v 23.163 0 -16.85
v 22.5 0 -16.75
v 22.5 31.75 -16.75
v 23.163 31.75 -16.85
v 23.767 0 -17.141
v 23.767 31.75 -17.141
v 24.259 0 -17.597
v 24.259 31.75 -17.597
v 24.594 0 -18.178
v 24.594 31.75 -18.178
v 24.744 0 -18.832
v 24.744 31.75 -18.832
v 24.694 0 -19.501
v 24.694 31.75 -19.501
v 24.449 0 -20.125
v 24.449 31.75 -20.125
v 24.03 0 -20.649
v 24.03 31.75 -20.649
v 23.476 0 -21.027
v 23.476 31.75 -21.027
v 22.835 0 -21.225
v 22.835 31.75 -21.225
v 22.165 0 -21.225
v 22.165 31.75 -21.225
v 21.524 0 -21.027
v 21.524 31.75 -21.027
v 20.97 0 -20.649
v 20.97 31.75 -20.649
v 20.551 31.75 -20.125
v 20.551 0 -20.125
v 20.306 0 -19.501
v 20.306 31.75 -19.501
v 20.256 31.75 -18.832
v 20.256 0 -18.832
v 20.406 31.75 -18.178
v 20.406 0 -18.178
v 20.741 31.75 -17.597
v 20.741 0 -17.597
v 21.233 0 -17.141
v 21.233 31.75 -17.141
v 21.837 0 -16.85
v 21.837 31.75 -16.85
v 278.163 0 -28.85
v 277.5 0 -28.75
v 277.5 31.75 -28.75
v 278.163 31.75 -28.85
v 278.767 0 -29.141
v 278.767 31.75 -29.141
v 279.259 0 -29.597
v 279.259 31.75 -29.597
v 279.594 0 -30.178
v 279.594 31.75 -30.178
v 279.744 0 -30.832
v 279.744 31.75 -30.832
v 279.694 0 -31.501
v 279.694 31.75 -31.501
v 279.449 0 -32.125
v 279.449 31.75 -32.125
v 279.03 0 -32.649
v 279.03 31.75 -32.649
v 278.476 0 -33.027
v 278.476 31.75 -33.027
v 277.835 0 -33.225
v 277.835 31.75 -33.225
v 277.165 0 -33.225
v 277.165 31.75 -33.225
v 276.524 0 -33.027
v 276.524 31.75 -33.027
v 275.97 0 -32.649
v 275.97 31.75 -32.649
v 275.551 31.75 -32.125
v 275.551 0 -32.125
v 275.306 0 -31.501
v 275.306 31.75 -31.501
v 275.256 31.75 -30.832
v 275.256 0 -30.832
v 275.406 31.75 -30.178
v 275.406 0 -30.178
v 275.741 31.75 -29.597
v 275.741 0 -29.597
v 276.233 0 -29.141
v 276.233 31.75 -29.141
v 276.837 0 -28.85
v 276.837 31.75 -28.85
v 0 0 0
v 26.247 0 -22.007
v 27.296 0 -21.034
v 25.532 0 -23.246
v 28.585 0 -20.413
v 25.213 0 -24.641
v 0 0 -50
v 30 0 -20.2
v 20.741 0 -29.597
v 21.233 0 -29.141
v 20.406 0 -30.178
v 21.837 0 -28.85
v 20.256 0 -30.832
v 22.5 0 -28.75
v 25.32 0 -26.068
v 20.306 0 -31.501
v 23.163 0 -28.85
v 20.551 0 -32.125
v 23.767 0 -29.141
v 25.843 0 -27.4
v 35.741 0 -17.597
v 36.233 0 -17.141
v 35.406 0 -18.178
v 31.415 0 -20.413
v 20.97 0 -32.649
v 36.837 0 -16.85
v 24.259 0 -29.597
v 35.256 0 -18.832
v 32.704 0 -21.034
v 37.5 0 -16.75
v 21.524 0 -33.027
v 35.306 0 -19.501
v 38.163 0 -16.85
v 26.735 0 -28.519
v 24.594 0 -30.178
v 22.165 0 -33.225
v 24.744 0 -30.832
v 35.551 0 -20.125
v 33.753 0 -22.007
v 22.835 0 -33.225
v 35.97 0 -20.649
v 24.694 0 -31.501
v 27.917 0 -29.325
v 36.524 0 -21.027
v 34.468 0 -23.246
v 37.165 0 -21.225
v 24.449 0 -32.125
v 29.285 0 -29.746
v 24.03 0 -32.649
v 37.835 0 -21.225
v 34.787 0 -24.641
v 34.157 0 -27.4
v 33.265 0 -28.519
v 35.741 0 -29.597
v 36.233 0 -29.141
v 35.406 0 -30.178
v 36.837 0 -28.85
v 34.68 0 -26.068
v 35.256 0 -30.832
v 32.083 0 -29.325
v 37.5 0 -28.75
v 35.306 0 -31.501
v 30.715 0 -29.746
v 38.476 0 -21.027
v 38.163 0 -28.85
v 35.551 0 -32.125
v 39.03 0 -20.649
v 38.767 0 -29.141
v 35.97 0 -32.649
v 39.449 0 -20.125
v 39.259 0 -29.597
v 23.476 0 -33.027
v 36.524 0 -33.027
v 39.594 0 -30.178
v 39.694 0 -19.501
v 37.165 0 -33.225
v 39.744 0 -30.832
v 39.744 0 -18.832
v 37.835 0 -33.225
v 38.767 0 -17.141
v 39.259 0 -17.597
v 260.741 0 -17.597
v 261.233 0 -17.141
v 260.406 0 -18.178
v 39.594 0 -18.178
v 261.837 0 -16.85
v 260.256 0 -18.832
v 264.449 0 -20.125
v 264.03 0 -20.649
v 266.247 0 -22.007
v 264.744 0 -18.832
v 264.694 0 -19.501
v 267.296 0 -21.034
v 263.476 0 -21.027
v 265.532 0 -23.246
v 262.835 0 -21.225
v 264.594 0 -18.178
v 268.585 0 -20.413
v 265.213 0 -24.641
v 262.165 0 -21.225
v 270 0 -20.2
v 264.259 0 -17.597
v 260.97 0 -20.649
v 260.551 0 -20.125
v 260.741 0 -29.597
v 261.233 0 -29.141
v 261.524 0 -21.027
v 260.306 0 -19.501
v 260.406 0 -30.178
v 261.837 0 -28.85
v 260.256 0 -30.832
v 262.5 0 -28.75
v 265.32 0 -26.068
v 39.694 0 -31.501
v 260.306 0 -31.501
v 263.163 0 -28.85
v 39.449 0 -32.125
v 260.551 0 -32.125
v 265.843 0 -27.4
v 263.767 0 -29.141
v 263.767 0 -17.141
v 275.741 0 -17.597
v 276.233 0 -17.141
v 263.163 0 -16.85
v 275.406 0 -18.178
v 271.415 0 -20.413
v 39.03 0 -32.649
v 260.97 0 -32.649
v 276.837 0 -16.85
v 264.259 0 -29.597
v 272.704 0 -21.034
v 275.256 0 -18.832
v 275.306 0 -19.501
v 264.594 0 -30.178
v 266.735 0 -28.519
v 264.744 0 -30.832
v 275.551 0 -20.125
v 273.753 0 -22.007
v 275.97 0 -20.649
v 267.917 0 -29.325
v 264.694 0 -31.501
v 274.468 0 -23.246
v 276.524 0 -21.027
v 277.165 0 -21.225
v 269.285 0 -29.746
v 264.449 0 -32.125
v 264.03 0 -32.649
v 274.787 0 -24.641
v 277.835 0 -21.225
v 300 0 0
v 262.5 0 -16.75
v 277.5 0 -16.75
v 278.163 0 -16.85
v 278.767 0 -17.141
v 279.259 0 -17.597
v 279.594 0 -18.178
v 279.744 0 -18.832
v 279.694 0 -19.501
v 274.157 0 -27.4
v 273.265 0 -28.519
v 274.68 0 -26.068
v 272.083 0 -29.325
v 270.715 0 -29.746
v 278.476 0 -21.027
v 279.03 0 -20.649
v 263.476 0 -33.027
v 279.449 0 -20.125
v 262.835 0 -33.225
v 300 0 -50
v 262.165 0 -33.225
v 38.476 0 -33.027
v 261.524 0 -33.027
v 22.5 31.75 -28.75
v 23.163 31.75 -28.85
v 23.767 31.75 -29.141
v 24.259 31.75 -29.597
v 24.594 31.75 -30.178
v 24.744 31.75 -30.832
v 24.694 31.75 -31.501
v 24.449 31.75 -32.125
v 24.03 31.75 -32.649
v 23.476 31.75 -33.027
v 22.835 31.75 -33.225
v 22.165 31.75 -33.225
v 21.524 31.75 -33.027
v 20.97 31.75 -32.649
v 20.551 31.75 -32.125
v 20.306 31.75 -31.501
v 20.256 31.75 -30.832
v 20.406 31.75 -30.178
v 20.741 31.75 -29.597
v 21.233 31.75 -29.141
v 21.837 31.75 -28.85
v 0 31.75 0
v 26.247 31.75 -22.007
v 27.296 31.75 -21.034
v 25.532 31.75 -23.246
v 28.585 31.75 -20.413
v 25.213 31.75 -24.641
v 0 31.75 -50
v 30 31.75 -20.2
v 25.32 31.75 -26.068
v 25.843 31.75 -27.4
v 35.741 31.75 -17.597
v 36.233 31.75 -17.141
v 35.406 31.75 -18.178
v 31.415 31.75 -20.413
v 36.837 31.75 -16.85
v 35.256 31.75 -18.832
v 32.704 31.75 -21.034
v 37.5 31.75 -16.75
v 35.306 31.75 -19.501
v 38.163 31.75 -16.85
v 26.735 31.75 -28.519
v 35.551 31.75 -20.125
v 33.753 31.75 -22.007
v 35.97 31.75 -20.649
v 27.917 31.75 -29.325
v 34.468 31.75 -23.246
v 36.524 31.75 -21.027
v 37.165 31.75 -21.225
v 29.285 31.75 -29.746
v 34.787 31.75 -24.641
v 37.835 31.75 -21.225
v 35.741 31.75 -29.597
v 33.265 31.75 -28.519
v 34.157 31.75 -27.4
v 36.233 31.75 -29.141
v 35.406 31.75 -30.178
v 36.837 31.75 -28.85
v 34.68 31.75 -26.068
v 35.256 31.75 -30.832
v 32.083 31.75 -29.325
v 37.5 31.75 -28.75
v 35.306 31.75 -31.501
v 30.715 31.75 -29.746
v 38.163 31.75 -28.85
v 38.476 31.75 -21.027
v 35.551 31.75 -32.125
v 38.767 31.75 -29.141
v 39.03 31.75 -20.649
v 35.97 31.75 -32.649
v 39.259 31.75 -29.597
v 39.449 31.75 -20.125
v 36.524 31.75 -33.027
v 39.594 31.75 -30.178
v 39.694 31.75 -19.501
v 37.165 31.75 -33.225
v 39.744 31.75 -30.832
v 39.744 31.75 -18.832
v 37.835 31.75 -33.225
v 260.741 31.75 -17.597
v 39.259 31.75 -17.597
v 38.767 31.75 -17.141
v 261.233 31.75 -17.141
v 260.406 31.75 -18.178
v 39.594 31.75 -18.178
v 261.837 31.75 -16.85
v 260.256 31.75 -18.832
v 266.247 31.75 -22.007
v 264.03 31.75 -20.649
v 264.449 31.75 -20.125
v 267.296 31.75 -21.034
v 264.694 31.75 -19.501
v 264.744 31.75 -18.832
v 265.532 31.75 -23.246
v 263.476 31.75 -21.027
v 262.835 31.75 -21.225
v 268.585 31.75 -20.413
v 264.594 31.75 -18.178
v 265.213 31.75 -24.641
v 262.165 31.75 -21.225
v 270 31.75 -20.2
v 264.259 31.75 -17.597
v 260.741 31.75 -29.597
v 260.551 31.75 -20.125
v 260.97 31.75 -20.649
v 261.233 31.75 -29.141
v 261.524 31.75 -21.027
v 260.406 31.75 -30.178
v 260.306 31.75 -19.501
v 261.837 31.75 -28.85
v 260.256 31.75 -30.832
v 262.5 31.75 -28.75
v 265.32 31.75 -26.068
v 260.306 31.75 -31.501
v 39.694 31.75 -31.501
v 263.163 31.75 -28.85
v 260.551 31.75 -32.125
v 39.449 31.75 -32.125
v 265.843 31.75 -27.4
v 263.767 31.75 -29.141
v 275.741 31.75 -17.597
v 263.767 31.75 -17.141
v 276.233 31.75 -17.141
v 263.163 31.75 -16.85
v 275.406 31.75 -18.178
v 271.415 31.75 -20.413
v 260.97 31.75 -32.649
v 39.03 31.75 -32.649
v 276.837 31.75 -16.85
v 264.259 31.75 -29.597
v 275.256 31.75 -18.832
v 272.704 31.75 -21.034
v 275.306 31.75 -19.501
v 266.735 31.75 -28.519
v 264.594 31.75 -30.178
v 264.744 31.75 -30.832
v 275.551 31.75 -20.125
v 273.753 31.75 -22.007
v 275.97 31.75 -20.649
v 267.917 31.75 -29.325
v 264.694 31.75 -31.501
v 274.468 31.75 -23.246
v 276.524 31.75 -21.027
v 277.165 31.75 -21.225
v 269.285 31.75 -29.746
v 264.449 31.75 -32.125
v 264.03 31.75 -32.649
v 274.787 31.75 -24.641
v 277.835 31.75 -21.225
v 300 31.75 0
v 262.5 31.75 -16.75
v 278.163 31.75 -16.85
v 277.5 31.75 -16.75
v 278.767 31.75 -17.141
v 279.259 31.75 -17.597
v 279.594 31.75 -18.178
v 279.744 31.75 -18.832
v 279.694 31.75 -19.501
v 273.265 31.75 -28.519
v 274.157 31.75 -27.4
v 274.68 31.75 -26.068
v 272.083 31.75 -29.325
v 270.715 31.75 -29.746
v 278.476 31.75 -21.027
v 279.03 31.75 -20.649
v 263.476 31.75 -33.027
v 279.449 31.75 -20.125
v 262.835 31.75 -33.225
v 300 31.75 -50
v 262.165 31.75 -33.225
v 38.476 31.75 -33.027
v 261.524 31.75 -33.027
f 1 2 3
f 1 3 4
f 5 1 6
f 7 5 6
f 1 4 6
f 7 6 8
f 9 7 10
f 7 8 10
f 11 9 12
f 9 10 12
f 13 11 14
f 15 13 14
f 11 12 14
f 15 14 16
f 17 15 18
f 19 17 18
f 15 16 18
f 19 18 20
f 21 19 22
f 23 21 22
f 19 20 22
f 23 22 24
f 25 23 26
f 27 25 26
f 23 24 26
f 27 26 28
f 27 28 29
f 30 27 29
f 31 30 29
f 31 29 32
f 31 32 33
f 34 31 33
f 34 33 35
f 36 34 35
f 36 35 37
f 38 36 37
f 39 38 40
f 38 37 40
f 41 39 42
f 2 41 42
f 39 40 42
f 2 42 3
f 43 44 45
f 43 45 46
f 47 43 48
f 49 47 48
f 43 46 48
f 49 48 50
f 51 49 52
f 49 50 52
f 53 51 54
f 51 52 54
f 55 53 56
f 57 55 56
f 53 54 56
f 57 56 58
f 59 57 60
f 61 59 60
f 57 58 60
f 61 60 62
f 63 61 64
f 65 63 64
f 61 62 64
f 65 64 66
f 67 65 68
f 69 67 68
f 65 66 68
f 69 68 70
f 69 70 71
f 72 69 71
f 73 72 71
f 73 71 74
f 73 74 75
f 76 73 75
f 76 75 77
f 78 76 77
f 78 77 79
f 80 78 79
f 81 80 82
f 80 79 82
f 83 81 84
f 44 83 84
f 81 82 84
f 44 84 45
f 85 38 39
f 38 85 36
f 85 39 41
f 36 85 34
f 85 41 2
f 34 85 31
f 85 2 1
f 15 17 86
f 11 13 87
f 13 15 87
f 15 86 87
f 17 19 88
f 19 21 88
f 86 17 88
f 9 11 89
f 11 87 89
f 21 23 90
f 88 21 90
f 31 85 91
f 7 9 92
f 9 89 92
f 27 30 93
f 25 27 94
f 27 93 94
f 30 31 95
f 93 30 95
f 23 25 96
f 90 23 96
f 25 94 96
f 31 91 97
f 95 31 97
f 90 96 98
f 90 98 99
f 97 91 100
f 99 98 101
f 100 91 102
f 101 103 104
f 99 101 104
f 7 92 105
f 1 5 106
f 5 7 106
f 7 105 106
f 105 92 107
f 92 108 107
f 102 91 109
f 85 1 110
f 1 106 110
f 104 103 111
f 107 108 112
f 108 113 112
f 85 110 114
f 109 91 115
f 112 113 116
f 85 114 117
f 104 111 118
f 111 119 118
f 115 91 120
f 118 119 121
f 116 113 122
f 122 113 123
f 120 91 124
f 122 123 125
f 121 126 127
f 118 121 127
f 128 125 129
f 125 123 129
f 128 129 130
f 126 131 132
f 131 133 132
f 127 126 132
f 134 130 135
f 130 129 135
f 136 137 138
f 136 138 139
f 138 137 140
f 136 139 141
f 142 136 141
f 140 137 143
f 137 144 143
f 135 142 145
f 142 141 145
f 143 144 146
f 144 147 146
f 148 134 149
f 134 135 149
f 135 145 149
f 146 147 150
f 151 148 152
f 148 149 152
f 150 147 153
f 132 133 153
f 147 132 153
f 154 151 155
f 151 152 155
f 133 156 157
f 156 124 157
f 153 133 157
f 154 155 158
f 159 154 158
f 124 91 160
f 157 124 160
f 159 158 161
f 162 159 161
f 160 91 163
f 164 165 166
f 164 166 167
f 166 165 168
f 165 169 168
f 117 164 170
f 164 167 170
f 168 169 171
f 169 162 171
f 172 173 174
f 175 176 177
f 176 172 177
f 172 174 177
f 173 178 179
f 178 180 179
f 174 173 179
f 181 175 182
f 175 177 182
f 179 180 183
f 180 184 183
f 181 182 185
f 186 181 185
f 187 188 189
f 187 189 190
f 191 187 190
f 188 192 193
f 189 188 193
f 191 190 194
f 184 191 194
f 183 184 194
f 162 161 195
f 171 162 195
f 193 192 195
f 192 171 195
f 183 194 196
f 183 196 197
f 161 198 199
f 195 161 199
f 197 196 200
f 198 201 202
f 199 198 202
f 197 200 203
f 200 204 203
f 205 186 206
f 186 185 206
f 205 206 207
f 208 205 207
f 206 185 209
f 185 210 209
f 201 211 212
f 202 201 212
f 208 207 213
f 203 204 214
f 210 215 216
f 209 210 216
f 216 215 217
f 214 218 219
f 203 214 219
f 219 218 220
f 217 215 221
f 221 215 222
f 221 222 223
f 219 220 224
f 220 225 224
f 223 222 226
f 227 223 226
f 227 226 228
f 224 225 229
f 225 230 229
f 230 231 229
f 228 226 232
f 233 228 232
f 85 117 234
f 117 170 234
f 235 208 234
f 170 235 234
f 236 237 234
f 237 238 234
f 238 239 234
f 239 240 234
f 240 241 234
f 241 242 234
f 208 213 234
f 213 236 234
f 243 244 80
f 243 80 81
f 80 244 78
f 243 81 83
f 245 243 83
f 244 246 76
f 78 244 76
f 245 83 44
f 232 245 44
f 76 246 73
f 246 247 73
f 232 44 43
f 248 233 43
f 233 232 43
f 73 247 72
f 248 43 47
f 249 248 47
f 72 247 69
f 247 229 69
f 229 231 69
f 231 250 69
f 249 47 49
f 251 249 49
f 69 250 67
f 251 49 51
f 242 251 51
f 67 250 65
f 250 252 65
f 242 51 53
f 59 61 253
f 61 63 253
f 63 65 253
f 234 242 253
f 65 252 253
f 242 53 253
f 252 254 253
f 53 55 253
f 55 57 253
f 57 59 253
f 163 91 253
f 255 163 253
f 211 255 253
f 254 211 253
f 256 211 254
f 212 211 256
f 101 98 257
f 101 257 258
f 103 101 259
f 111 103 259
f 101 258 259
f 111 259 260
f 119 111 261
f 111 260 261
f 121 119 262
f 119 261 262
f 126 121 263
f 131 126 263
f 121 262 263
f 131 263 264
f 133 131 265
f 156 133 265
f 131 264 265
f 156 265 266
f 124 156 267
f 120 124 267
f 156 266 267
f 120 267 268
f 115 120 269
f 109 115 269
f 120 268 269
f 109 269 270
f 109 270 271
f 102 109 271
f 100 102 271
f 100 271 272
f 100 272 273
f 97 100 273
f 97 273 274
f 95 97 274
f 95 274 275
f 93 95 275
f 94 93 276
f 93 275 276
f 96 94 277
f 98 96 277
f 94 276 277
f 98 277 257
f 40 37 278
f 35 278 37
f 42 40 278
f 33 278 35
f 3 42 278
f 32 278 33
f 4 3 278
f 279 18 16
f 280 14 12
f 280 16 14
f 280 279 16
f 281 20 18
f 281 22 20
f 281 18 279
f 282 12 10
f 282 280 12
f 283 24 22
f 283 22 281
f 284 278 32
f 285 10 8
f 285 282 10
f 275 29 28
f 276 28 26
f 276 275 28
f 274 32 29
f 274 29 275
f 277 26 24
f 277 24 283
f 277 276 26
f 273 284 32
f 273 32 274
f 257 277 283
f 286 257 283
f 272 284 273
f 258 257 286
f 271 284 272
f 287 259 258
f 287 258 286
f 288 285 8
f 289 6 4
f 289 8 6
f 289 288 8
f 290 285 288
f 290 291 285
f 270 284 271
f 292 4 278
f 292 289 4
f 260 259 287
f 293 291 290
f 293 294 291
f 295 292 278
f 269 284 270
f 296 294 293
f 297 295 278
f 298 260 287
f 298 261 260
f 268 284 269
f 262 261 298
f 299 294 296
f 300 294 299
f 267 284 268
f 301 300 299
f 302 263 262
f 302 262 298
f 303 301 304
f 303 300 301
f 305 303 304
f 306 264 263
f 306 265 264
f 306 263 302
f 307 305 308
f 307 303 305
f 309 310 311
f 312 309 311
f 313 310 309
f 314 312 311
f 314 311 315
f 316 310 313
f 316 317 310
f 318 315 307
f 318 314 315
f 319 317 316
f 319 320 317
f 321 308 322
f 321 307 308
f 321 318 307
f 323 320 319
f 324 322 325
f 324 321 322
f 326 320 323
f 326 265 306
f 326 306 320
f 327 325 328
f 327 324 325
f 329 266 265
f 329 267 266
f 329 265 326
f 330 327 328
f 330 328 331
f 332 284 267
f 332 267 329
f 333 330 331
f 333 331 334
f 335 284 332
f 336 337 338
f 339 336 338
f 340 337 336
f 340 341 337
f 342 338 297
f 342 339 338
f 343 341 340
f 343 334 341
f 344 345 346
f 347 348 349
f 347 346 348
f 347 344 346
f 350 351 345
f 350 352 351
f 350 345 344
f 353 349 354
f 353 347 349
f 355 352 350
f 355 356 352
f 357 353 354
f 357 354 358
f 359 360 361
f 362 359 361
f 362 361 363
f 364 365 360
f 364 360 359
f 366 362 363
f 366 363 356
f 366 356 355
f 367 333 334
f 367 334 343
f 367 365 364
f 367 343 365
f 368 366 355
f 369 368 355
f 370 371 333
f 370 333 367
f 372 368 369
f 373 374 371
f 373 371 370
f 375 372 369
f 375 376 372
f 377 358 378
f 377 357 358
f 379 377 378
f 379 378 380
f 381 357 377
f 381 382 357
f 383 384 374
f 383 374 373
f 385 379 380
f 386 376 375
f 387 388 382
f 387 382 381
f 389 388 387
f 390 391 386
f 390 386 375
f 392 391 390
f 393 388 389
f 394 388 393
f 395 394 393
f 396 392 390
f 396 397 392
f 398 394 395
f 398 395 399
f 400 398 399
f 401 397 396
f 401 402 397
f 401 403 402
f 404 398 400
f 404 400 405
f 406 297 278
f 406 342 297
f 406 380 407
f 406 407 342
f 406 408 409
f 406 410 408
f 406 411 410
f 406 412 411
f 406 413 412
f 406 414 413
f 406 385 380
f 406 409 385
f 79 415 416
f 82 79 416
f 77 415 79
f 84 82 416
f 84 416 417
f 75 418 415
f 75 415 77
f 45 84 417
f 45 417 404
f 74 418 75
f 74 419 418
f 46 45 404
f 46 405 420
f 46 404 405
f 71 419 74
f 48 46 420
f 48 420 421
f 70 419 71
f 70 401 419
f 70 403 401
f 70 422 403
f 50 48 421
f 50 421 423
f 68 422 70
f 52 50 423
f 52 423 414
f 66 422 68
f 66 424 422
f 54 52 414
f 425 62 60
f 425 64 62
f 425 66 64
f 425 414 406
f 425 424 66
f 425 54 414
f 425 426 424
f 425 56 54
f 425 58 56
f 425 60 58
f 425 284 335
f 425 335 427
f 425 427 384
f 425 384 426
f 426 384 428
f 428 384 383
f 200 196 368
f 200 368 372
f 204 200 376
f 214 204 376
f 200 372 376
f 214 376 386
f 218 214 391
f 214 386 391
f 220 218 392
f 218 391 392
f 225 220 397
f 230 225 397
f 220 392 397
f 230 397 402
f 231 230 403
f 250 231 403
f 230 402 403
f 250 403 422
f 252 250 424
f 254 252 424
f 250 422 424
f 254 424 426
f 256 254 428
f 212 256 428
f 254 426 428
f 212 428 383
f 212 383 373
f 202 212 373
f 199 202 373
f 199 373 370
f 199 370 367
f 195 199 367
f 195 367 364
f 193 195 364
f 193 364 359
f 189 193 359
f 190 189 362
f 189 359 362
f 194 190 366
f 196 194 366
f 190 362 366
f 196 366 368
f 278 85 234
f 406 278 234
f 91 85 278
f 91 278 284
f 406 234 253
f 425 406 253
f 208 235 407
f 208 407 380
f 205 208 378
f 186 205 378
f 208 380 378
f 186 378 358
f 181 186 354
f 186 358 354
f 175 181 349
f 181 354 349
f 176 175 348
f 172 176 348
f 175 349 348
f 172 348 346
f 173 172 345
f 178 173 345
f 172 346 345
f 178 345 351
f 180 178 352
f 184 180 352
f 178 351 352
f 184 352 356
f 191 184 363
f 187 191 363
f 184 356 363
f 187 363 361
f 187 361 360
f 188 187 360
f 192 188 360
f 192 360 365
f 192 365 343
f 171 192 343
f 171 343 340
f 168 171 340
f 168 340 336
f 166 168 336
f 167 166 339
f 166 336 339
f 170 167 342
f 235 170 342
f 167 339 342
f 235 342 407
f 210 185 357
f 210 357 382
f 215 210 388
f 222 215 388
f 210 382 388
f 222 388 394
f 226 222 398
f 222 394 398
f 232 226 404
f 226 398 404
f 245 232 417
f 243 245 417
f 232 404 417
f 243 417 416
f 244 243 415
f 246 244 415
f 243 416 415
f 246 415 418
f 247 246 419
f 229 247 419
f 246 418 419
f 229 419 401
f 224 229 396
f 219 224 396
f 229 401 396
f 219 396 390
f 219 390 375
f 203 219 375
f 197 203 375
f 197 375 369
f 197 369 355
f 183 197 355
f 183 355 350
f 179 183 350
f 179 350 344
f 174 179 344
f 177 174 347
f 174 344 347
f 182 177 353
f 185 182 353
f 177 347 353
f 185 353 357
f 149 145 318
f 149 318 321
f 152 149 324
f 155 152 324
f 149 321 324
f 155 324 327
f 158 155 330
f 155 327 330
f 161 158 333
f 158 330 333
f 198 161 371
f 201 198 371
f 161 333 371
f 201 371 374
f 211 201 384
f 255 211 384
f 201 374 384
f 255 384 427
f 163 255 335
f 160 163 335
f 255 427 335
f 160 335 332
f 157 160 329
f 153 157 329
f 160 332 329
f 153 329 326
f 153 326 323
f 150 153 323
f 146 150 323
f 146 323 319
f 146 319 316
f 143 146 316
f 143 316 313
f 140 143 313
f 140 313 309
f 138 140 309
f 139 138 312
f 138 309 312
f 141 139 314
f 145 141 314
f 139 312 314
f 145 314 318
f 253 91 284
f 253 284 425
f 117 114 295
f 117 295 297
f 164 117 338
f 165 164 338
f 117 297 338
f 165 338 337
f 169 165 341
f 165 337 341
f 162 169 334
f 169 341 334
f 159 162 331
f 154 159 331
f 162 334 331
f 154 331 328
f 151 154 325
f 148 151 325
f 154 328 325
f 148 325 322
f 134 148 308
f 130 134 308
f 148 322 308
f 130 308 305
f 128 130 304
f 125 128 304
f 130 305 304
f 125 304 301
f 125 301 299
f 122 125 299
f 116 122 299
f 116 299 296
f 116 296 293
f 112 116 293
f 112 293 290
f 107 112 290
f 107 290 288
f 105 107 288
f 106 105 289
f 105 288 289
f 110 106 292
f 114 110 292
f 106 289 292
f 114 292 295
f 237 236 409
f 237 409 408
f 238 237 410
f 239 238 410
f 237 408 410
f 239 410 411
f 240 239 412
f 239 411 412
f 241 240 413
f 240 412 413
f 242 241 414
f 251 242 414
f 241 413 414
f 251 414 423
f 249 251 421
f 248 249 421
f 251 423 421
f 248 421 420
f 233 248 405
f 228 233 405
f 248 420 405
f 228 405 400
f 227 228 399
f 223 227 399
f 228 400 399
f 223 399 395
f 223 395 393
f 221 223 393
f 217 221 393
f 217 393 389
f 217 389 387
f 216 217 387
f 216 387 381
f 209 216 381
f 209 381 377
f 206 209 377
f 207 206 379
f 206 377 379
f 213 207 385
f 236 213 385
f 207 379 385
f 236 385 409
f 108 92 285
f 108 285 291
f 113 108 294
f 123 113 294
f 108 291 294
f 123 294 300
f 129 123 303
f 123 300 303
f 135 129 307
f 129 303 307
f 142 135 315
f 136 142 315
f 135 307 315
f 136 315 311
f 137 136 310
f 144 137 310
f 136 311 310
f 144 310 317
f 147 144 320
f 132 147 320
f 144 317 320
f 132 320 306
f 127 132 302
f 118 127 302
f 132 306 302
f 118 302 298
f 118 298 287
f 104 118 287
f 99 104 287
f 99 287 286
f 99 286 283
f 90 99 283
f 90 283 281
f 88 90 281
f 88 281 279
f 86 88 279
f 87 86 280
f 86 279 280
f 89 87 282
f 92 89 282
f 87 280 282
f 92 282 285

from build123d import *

# Parameters (mm, degrees)
SKETCH2_W           = 300
SKETCH2_H           = 50
BOSS_EXTRUDE1_DEPTH = 31.75
SKETCH3_R           = 4.8
SKETCH3_R_2         = 2.25
CUT_EXTRUDE1_DEPTH  = 31.75
SKETCH3_3_R         = 2.25
CUT_EXTRUDE2_DEPTH  = 31.75


with BuildPart() as part:
    # Sketch2 → Boss-Extrude1 (new body)
    with BuildSketch(Plane(origin=(0, 0, 0), x_dir=(1, 0, 0), z_dir=(0, 1, 0))):
        with Locations((150, 25)):
            Rectangle(SKETCH2_W, SKETCH2_H)
    extrude(amount=BOSS_EXTRUDE1_DEPTH)

    # Sketch3 → Cut-Extrude1 (cut)
    with BuildSketch(Plane(origin=(0, 31.75, 0), x_dir=(1, 0, 0), z_dir=(0, 1, 0))):
        with Locations((30, 25)):
            Circle(SKETCH3_R)
        with Locations((22.5, 19)):
            Circle(SKETCH3_R_2)
        with Locations((270, 25)):
            Circle(SKETCH3_R)
        with Locations((277.5, 19)):
            Circle(SKETCH3_R_2)
    extrude(amount=-CUT_EXTRUDE1_DEPTH, mode=Mode.SUBTRACT)

    # Sketch3<3> → Cut-Extrude2 (cut)
    with BuildSketch(Plane(origin=(0, 31.75, 0), x_dir=(1, 0, 0), z_dir=(0, 1, 0))):
        with Locations((37.5, 31)):
            Circle(SKETCH3_3_R)
        with Locations((37.5, 19)):
            Circle(SKETCH3_3_R)
        with Locations((22.5, 31)):
            Circle(SKETCH3_3_R)
        with Locations((277.5, 31)):
            Circle(SKETCH3_3_R)
        with Locations((262.5, 19)):
            Circle(SKETCH3_3_R)
        with Locations((262.5, 31)):
            Circle(SKETCH3_3_R)
    extrude(amount=-CUT_EXTRUDE2_DEPTH, mode=Mode.SUBTRACT)


solid = part.part
